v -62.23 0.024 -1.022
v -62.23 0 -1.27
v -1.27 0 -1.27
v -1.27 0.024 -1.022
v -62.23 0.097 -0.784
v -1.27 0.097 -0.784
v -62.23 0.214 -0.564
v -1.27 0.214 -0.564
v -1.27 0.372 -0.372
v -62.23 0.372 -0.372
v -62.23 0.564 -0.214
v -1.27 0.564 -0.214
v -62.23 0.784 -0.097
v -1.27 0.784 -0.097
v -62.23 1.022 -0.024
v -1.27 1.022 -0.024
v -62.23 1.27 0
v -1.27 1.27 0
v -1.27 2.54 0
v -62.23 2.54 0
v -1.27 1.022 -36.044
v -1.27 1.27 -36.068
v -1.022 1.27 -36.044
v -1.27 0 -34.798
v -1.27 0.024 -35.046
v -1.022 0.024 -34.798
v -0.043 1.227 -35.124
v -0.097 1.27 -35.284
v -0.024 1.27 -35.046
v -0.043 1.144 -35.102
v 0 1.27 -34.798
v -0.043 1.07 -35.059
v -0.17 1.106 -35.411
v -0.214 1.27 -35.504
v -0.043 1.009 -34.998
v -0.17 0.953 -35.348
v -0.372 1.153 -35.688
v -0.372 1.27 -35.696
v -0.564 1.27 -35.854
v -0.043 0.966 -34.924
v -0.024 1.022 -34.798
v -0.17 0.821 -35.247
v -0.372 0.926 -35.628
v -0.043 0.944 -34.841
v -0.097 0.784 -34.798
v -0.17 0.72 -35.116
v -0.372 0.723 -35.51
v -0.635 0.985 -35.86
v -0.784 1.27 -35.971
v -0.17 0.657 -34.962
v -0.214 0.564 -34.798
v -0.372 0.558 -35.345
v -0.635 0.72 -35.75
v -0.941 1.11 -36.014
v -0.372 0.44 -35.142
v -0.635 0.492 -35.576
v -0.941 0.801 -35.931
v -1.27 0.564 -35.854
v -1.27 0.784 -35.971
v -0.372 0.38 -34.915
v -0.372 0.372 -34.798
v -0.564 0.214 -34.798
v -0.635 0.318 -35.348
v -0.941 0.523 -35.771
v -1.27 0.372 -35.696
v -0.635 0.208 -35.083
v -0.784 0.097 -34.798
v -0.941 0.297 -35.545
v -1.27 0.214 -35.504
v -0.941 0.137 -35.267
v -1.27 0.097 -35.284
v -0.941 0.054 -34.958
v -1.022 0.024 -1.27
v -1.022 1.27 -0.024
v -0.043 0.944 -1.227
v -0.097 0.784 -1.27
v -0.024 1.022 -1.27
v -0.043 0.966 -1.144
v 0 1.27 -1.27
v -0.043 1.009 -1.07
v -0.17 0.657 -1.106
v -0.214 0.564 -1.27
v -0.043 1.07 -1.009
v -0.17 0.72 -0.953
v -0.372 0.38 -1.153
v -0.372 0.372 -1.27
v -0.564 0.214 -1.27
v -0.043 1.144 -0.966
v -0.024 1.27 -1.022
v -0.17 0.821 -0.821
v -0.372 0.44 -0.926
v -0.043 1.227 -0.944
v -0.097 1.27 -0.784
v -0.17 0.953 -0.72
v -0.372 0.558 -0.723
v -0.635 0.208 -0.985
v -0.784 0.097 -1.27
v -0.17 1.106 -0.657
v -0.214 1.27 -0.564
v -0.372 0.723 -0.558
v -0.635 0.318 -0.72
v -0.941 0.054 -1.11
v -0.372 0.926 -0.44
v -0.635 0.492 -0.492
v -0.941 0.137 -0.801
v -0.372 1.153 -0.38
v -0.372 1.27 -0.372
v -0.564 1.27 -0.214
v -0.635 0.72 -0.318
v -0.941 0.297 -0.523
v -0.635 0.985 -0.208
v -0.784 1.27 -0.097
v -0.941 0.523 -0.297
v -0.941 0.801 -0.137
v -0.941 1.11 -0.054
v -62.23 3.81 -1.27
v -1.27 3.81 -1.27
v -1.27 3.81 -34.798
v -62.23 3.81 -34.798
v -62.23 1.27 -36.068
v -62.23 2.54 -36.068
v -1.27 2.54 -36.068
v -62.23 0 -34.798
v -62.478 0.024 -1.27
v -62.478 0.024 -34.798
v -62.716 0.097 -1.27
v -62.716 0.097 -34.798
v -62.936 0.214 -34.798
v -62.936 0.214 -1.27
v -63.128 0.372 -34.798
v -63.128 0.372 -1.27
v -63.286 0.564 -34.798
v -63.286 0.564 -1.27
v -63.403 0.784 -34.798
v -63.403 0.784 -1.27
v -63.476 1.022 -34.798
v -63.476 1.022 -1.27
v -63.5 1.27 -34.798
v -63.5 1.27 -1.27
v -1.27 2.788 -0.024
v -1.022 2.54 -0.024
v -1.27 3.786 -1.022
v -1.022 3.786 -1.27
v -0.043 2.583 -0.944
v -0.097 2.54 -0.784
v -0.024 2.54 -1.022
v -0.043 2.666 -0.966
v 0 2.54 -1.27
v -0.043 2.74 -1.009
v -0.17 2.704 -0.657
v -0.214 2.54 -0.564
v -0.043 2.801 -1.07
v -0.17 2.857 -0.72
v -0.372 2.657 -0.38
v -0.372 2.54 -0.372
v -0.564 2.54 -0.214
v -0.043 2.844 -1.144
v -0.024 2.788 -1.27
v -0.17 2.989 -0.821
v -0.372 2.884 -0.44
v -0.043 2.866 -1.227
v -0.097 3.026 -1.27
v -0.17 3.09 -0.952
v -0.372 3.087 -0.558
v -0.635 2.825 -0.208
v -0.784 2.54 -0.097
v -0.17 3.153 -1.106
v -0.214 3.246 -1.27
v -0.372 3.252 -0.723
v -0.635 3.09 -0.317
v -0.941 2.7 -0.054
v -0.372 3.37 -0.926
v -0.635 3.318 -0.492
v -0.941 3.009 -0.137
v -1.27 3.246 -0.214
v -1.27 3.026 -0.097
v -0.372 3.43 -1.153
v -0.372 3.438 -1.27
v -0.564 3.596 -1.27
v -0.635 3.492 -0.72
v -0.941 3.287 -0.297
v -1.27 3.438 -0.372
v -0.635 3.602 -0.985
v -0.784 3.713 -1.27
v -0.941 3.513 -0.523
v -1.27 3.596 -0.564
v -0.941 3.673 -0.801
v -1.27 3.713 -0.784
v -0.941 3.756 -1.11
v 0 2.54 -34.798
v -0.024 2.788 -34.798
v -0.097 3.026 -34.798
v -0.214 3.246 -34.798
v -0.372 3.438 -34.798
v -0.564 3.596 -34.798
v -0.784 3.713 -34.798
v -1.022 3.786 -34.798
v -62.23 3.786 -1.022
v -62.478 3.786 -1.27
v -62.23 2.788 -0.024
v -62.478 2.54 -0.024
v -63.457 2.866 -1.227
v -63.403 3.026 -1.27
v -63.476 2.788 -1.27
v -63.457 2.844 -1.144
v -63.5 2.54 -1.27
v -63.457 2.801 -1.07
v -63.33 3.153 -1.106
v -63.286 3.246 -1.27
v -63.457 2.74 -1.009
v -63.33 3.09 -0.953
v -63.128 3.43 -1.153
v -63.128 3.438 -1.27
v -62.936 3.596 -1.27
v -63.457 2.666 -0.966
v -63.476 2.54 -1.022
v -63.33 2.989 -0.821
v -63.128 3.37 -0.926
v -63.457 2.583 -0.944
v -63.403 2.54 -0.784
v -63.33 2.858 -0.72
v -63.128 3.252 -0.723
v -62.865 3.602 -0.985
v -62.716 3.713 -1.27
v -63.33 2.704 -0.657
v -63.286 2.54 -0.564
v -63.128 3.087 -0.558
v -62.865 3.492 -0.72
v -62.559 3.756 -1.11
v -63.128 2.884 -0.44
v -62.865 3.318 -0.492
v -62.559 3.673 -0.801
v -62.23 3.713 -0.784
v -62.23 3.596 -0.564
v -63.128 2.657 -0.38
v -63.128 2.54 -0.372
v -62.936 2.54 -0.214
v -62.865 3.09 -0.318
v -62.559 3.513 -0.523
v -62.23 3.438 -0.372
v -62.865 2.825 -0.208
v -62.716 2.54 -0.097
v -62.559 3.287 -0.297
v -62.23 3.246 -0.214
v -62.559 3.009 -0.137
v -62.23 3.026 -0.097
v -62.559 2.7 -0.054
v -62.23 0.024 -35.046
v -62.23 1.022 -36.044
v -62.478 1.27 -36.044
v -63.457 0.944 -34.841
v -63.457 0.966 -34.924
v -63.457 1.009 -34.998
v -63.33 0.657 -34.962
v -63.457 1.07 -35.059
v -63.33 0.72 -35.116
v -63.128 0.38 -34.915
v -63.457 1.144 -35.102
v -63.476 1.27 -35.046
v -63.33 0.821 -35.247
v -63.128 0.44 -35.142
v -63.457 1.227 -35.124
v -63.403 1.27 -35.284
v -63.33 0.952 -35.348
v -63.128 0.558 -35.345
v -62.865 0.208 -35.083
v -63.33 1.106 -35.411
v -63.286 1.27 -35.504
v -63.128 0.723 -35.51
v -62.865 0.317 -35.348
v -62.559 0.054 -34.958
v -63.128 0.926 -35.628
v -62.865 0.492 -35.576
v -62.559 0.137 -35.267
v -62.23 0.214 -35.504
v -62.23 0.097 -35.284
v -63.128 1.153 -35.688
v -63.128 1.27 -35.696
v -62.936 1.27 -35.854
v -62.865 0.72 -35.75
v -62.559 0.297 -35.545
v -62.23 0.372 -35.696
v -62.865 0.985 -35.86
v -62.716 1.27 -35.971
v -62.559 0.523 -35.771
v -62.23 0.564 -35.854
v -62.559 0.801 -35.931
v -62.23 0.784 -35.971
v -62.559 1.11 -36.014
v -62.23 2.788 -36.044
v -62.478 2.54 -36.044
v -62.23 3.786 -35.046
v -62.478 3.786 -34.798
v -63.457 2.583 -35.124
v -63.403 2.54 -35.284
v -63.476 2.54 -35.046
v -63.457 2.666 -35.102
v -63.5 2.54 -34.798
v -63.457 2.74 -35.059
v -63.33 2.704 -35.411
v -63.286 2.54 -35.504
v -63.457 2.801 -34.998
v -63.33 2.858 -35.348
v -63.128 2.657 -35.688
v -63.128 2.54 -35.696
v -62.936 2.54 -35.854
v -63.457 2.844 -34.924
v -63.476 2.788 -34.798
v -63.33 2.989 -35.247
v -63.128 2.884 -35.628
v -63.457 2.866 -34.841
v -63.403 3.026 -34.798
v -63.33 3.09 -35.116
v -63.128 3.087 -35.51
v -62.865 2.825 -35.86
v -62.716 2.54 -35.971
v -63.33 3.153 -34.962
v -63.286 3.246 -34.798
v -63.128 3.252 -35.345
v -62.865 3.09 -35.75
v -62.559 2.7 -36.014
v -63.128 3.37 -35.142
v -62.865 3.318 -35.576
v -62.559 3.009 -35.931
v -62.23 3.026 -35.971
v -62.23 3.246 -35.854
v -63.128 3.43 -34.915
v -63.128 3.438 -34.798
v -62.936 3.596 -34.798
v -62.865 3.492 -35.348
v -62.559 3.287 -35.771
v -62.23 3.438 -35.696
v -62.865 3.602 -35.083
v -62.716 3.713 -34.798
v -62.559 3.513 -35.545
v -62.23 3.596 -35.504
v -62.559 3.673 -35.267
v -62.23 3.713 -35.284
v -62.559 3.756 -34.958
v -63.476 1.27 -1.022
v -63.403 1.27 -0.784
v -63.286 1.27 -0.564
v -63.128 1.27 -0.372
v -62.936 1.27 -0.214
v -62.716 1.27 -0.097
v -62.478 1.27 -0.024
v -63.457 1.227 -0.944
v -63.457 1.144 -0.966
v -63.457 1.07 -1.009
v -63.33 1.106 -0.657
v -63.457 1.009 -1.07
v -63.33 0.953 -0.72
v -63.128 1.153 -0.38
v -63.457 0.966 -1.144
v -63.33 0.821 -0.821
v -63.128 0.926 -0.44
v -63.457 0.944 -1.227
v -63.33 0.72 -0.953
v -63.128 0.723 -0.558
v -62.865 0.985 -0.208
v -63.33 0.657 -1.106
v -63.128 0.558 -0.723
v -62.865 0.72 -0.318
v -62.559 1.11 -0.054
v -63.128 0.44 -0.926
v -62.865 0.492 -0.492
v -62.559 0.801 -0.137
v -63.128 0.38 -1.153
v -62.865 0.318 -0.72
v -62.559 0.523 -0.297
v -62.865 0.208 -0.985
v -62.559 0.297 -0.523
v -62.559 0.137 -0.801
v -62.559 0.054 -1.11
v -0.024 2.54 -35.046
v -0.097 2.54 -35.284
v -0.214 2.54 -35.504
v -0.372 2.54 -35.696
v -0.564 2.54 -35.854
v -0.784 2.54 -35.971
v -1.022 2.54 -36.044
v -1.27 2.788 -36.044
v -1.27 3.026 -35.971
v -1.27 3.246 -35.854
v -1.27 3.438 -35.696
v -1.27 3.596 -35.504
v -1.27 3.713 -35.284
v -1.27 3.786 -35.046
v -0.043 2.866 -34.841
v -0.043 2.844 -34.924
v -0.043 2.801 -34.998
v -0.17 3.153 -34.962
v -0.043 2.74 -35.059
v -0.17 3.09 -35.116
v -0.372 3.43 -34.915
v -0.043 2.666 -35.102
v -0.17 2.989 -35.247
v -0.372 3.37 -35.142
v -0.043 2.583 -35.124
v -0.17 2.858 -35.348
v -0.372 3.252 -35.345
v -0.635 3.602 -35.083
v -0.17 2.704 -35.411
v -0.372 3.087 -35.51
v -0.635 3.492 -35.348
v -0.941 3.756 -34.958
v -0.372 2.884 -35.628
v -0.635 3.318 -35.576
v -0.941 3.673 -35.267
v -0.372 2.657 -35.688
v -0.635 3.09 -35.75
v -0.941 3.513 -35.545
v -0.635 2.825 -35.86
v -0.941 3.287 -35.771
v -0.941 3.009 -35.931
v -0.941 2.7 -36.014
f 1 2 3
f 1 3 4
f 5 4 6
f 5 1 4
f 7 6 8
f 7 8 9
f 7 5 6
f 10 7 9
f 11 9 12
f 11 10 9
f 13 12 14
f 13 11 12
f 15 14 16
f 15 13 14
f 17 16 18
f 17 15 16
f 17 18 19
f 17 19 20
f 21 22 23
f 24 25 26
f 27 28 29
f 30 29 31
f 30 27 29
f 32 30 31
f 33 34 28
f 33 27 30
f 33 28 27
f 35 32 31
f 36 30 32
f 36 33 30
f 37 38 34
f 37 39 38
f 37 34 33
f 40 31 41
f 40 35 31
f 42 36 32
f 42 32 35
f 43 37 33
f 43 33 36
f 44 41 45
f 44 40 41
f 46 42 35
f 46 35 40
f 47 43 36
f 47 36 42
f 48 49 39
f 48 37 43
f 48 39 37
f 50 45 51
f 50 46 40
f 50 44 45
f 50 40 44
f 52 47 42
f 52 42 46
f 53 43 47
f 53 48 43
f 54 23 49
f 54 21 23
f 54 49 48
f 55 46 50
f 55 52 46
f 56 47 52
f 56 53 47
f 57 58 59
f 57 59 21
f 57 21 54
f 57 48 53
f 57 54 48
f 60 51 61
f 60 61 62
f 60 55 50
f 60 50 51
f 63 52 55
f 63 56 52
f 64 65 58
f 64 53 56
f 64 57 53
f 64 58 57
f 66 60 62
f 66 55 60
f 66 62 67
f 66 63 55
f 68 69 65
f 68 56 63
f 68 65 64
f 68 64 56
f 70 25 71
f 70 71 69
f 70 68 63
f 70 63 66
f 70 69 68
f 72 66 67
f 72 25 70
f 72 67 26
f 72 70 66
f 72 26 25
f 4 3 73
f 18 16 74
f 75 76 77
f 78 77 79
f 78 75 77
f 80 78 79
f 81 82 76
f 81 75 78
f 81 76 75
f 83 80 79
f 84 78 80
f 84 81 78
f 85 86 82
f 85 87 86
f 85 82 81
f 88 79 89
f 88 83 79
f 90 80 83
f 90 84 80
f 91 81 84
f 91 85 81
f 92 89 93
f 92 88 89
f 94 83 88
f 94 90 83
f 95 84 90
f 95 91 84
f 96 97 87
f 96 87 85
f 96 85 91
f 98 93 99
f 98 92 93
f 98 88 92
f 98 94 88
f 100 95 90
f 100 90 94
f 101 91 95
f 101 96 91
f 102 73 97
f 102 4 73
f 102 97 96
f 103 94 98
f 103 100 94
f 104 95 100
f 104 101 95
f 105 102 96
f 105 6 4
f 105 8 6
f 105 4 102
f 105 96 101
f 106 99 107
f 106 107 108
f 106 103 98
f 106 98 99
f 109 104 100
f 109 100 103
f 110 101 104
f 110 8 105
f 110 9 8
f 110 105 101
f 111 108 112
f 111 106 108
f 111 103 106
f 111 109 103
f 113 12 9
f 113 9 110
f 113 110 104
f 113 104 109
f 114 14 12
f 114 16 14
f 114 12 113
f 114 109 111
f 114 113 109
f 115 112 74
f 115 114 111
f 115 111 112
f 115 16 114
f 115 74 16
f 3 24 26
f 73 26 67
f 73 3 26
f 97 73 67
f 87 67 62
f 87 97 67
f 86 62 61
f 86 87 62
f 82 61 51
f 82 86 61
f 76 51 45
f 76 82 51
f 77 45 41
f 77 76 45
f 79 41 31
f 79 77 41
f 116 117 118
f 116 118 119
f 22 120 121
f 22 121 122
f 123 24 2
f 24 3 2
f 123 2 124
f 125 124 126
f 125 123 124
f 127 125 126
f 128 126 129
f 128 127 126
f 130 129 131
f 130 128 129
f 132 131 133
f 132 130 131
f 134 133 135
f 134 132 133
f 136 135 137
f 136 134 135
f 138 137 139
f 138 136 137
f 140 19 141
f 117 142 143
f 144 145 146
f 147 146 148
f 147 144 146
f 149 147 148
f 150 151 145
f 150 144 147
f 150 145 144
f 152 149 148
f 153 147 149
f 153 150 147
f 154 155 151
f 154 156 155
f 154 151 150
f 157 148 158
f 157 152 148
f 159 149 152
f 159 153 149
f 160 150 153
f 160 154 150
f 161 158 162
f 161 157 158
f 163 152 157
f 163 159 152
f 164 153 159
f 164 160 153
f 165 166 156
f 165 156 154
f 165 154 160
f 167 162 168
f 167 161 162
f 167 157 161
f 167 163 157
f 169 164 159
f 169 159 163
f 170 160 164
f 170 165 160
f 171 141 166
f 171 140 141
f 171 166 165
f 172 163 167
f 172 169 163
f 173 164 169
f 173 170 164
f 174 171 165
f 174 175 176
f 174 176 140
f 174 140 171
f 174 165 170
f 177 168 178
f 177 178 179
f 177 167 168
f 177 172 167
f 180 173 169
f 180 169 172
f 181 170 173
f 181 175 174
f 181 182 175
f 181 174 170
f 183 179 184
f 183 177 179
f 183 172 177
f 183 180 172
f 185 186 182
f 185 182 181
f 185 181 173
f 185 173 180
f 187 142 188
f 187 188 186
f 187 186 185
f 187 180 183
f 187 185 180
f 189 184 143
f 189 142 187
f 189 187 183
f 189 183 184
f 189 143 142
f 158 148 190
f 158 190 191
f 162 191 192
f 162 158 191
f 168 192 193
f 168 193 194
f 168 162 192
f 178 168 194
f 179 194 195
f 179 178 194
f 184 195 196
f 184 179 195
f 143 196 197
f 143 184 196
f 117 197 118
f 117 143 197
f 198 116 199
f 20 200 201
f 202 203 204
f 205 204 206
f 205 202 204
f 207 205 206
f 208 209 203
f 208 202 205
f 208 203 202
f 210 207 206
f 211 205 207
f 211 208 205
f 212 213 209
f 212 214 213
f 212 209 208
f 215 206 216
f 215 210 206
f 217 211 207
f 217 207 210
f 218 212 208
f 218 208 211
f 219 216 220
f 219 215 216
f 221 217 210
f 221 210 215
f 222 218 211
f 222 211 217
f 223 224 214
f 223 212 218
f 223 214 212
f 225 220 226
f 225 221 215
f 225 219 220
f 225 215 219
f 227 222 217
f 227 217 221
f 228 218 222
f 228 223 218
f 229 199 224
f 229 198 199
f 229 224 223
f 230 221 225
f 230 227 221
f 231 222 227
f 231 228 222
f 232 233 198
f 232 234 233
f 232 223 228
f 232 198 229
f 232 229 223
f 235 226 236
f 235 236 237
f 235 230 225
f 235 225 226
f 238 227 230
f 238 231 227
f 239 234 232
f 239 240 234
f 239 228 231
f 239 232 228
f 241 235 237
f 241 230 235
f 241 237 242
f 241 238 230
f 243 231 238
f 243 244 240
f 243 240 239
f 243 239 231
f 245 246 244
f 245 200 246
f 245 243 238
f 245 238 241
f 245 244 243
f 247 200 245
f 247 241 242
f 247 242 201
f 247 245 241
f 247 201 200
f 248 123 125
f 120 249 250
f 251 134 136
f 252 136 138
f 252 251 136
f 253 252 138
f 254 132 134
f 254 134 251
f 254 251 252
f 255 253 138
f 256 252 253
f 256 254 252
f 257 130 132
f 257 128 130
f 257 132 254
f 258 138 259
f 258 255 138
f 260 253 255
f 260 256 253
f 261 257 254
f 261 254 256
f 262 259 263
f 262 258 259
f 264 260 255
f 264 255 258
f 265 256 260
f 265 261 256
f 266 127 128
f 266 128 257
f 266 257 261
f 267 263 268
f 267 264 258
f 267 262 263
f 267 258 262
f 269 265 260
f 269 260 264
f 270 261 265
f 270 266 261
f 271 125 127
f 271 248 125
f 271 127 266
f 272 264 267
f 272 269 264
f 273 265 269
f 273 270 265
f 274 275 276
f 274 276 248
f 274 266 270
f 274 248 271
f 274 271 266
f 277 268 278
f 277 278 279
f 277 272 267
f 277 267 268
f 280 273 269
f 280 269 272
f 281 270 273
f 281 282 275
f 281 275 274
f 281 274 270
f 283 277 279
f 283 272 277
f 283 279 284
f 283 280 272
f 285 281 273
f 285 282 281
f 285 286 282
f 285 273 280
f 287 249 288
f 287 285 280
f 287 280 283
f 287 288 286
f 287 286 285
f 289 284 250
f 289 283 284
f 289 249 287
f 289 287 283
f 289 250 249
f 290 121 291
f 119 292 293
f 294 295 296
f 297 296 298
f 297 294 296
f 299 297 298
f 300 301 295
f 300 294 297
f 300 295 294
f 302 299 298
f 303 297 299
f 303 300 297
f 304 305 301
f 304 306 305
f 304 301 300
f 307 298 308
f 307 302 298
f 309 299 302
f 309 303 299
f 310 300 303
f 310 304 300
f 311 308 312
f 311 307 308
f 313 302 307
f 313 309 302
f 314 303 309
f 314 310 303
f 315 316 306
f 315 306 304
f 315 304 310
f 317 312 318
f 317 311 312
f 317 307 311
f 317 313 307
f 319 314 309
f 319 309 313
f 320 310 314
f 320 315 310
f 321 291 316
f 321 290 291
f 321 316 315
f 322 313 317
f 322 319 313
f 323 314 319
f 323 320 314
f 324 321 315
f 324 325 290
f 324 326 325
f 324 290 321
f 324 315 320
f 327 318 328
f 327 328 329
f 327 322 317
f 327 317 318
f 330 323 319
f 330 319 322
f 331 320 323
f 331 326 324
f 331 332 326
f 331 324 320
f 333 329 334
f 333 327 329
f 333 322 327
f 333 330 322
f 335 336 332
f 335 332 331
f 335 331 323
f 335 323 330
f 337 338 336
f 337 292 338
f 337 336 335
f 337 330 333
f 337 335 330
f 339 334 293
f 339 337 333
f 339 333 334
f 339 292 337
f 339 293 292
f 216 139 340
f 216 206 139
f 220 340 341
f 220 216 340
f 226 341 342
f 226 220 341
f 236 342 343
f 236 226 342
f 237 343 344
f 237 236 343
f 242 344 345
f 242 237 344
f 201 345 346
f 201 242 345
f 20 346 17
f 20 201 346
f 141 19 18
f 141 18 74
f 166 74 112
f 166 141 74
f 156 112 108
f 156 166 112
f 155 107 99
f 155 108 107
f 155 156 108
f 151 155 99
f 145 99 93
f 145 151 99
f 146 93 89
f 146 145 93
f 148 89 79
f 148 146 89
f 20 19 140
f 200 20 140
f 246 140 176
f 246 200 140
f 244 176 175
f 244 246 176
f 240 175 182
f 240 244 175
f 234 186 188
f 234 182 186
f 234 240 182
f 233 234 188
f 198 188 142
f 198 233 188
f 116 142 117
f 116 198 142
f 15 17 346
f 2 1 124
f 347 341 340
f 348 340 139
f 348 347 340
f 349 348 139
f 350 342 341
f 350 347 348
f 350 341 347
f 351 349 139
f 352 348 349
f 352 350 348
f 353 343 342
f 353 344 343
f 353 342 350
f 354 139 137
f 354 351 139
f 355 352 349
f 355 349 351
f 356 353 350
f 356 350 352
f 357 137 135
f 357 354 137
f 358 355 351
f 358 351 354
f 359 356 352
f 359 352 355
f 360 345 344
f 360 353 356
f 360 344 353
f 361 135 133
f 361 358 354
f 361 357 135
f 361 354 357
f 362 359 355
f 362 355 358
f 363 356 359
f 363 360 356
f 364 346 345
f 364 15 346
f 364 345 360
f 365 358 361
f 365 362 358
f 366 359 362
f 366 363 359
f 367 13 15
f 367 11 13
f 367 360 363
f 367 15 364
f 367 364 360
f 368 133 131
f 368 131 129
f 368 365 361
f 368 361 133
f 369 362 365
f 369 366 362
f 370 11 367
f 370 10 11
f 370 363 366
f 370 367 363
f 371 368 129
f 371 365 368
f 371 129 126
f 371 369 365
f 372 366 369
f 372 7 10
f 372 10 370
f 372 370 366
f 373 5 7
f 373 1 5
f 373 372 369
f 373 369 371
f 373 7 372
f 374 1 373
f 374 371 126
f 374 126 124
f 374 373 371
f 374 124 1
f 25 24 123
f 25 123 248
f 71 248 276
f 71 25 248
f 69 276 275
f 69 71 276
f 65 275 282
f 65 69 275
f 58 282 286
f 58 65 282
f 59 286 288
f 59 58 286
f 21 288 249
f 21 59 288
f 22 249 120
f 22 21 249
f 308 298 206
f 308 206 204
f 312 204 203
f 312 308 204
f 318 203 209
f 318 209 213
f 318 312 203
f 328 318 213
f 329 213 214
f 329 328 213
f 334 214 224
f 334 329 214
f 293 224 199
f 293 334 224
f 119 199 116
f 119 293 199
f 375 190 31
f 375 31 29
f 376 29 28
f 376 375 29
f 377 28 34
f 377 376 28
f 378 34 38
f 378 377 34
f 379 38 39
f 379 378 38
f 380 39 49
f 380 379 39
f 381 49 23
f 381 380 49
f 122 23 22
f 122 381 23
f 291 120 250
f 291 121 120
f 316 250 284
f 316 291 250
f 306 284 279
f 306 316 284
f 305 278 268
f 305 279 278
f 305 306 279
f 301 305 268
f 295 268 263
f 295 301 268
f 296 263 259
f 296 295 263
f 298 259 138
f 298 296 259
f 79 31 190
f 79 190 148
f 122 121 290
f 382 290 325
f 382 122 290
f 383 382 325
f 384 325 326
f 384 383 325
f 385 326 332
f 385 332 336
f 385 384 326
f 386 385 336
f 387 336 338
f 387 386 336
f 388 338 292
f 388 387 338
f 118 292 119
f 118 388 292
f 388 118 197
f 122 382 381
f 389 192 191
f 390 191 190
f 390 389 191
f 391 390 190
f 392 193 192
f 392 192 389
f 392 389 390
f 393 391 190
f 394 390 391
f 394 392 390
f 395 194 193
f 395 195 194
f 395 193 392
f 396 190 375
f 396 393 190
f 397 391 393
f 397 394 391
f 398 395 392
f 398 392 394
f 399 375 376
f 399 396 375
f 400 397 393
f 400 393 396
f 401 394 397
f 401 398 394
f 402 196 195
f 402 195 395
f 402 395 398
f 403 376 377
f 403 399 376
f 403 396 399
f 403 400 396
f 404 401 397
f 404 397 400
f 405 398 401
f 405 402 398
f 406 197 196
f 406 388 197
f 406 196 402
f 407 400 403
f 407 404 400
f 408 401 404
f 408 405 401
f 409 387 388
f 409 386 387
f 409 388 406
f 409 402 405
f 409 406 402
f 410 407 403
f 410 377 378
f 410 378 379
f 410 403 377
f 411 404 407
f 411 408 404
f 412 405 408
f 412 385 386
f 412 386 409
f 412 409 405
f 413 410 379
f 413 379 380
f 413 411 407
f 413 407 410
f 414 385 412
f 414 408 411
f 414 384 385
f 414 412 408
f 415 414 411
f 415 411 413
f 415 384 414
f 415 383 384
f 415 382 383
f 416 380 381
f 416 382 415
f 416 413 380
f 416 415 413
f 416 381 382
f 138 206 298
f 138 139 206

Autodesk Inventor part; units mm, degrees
ref_plane "YZ Plane" through (0, 0, 0) normal (1, 0, 0) x (0, 1, 0)
ref_plane "XZ Plane" through (0, 0, 0) normal (0, 1, 0) x (-1, 0, 0)
ref_plane "XY Plane" through (0, 0, 0) normal (0, 0, 1) x (1, 0, 0)
sketch "Sketch1" plane through (0, 0, 0) normal (0, 1, 0) x (-1, 0, 0)
  line L0 (0, 0) -> (63.5, 0)
  line L1 (63.5, 0) -> (63.5, -36.068)
  line L2 (63.5, -36.068) -> (0, -36.068)
  line L3 (0, -36.068) -> (0, 0)
  dimension "d0" = 63.5
  dimension "d1" = 36.068
extrude "Extrusion1" add sketch "Sketch1" along normal blind 3.81
sketch "Sketch2" plane through (0, 0, 0) normal (1, 0, 0) x (0, 0, -1)
  point P0 (0, 0)
fillet "Fillet1" radius 1.27 12 edges at (-31.75, 3.81, 0) (-31.75, 3.81, -36.068) (-31.75, 0, 0) (-31.75, 0, -36.068) (0, 0, -18.034) (0, 3.81, -18.034) (0, 1.905, 0) (0, 1.905, -36.068) (-63.5, 1.905, -36.068) (-63.5, 3.81, -18.034) (-63.5, 1.905, 0) (-63.5, 0, -18.034)
properties part number "battery"
